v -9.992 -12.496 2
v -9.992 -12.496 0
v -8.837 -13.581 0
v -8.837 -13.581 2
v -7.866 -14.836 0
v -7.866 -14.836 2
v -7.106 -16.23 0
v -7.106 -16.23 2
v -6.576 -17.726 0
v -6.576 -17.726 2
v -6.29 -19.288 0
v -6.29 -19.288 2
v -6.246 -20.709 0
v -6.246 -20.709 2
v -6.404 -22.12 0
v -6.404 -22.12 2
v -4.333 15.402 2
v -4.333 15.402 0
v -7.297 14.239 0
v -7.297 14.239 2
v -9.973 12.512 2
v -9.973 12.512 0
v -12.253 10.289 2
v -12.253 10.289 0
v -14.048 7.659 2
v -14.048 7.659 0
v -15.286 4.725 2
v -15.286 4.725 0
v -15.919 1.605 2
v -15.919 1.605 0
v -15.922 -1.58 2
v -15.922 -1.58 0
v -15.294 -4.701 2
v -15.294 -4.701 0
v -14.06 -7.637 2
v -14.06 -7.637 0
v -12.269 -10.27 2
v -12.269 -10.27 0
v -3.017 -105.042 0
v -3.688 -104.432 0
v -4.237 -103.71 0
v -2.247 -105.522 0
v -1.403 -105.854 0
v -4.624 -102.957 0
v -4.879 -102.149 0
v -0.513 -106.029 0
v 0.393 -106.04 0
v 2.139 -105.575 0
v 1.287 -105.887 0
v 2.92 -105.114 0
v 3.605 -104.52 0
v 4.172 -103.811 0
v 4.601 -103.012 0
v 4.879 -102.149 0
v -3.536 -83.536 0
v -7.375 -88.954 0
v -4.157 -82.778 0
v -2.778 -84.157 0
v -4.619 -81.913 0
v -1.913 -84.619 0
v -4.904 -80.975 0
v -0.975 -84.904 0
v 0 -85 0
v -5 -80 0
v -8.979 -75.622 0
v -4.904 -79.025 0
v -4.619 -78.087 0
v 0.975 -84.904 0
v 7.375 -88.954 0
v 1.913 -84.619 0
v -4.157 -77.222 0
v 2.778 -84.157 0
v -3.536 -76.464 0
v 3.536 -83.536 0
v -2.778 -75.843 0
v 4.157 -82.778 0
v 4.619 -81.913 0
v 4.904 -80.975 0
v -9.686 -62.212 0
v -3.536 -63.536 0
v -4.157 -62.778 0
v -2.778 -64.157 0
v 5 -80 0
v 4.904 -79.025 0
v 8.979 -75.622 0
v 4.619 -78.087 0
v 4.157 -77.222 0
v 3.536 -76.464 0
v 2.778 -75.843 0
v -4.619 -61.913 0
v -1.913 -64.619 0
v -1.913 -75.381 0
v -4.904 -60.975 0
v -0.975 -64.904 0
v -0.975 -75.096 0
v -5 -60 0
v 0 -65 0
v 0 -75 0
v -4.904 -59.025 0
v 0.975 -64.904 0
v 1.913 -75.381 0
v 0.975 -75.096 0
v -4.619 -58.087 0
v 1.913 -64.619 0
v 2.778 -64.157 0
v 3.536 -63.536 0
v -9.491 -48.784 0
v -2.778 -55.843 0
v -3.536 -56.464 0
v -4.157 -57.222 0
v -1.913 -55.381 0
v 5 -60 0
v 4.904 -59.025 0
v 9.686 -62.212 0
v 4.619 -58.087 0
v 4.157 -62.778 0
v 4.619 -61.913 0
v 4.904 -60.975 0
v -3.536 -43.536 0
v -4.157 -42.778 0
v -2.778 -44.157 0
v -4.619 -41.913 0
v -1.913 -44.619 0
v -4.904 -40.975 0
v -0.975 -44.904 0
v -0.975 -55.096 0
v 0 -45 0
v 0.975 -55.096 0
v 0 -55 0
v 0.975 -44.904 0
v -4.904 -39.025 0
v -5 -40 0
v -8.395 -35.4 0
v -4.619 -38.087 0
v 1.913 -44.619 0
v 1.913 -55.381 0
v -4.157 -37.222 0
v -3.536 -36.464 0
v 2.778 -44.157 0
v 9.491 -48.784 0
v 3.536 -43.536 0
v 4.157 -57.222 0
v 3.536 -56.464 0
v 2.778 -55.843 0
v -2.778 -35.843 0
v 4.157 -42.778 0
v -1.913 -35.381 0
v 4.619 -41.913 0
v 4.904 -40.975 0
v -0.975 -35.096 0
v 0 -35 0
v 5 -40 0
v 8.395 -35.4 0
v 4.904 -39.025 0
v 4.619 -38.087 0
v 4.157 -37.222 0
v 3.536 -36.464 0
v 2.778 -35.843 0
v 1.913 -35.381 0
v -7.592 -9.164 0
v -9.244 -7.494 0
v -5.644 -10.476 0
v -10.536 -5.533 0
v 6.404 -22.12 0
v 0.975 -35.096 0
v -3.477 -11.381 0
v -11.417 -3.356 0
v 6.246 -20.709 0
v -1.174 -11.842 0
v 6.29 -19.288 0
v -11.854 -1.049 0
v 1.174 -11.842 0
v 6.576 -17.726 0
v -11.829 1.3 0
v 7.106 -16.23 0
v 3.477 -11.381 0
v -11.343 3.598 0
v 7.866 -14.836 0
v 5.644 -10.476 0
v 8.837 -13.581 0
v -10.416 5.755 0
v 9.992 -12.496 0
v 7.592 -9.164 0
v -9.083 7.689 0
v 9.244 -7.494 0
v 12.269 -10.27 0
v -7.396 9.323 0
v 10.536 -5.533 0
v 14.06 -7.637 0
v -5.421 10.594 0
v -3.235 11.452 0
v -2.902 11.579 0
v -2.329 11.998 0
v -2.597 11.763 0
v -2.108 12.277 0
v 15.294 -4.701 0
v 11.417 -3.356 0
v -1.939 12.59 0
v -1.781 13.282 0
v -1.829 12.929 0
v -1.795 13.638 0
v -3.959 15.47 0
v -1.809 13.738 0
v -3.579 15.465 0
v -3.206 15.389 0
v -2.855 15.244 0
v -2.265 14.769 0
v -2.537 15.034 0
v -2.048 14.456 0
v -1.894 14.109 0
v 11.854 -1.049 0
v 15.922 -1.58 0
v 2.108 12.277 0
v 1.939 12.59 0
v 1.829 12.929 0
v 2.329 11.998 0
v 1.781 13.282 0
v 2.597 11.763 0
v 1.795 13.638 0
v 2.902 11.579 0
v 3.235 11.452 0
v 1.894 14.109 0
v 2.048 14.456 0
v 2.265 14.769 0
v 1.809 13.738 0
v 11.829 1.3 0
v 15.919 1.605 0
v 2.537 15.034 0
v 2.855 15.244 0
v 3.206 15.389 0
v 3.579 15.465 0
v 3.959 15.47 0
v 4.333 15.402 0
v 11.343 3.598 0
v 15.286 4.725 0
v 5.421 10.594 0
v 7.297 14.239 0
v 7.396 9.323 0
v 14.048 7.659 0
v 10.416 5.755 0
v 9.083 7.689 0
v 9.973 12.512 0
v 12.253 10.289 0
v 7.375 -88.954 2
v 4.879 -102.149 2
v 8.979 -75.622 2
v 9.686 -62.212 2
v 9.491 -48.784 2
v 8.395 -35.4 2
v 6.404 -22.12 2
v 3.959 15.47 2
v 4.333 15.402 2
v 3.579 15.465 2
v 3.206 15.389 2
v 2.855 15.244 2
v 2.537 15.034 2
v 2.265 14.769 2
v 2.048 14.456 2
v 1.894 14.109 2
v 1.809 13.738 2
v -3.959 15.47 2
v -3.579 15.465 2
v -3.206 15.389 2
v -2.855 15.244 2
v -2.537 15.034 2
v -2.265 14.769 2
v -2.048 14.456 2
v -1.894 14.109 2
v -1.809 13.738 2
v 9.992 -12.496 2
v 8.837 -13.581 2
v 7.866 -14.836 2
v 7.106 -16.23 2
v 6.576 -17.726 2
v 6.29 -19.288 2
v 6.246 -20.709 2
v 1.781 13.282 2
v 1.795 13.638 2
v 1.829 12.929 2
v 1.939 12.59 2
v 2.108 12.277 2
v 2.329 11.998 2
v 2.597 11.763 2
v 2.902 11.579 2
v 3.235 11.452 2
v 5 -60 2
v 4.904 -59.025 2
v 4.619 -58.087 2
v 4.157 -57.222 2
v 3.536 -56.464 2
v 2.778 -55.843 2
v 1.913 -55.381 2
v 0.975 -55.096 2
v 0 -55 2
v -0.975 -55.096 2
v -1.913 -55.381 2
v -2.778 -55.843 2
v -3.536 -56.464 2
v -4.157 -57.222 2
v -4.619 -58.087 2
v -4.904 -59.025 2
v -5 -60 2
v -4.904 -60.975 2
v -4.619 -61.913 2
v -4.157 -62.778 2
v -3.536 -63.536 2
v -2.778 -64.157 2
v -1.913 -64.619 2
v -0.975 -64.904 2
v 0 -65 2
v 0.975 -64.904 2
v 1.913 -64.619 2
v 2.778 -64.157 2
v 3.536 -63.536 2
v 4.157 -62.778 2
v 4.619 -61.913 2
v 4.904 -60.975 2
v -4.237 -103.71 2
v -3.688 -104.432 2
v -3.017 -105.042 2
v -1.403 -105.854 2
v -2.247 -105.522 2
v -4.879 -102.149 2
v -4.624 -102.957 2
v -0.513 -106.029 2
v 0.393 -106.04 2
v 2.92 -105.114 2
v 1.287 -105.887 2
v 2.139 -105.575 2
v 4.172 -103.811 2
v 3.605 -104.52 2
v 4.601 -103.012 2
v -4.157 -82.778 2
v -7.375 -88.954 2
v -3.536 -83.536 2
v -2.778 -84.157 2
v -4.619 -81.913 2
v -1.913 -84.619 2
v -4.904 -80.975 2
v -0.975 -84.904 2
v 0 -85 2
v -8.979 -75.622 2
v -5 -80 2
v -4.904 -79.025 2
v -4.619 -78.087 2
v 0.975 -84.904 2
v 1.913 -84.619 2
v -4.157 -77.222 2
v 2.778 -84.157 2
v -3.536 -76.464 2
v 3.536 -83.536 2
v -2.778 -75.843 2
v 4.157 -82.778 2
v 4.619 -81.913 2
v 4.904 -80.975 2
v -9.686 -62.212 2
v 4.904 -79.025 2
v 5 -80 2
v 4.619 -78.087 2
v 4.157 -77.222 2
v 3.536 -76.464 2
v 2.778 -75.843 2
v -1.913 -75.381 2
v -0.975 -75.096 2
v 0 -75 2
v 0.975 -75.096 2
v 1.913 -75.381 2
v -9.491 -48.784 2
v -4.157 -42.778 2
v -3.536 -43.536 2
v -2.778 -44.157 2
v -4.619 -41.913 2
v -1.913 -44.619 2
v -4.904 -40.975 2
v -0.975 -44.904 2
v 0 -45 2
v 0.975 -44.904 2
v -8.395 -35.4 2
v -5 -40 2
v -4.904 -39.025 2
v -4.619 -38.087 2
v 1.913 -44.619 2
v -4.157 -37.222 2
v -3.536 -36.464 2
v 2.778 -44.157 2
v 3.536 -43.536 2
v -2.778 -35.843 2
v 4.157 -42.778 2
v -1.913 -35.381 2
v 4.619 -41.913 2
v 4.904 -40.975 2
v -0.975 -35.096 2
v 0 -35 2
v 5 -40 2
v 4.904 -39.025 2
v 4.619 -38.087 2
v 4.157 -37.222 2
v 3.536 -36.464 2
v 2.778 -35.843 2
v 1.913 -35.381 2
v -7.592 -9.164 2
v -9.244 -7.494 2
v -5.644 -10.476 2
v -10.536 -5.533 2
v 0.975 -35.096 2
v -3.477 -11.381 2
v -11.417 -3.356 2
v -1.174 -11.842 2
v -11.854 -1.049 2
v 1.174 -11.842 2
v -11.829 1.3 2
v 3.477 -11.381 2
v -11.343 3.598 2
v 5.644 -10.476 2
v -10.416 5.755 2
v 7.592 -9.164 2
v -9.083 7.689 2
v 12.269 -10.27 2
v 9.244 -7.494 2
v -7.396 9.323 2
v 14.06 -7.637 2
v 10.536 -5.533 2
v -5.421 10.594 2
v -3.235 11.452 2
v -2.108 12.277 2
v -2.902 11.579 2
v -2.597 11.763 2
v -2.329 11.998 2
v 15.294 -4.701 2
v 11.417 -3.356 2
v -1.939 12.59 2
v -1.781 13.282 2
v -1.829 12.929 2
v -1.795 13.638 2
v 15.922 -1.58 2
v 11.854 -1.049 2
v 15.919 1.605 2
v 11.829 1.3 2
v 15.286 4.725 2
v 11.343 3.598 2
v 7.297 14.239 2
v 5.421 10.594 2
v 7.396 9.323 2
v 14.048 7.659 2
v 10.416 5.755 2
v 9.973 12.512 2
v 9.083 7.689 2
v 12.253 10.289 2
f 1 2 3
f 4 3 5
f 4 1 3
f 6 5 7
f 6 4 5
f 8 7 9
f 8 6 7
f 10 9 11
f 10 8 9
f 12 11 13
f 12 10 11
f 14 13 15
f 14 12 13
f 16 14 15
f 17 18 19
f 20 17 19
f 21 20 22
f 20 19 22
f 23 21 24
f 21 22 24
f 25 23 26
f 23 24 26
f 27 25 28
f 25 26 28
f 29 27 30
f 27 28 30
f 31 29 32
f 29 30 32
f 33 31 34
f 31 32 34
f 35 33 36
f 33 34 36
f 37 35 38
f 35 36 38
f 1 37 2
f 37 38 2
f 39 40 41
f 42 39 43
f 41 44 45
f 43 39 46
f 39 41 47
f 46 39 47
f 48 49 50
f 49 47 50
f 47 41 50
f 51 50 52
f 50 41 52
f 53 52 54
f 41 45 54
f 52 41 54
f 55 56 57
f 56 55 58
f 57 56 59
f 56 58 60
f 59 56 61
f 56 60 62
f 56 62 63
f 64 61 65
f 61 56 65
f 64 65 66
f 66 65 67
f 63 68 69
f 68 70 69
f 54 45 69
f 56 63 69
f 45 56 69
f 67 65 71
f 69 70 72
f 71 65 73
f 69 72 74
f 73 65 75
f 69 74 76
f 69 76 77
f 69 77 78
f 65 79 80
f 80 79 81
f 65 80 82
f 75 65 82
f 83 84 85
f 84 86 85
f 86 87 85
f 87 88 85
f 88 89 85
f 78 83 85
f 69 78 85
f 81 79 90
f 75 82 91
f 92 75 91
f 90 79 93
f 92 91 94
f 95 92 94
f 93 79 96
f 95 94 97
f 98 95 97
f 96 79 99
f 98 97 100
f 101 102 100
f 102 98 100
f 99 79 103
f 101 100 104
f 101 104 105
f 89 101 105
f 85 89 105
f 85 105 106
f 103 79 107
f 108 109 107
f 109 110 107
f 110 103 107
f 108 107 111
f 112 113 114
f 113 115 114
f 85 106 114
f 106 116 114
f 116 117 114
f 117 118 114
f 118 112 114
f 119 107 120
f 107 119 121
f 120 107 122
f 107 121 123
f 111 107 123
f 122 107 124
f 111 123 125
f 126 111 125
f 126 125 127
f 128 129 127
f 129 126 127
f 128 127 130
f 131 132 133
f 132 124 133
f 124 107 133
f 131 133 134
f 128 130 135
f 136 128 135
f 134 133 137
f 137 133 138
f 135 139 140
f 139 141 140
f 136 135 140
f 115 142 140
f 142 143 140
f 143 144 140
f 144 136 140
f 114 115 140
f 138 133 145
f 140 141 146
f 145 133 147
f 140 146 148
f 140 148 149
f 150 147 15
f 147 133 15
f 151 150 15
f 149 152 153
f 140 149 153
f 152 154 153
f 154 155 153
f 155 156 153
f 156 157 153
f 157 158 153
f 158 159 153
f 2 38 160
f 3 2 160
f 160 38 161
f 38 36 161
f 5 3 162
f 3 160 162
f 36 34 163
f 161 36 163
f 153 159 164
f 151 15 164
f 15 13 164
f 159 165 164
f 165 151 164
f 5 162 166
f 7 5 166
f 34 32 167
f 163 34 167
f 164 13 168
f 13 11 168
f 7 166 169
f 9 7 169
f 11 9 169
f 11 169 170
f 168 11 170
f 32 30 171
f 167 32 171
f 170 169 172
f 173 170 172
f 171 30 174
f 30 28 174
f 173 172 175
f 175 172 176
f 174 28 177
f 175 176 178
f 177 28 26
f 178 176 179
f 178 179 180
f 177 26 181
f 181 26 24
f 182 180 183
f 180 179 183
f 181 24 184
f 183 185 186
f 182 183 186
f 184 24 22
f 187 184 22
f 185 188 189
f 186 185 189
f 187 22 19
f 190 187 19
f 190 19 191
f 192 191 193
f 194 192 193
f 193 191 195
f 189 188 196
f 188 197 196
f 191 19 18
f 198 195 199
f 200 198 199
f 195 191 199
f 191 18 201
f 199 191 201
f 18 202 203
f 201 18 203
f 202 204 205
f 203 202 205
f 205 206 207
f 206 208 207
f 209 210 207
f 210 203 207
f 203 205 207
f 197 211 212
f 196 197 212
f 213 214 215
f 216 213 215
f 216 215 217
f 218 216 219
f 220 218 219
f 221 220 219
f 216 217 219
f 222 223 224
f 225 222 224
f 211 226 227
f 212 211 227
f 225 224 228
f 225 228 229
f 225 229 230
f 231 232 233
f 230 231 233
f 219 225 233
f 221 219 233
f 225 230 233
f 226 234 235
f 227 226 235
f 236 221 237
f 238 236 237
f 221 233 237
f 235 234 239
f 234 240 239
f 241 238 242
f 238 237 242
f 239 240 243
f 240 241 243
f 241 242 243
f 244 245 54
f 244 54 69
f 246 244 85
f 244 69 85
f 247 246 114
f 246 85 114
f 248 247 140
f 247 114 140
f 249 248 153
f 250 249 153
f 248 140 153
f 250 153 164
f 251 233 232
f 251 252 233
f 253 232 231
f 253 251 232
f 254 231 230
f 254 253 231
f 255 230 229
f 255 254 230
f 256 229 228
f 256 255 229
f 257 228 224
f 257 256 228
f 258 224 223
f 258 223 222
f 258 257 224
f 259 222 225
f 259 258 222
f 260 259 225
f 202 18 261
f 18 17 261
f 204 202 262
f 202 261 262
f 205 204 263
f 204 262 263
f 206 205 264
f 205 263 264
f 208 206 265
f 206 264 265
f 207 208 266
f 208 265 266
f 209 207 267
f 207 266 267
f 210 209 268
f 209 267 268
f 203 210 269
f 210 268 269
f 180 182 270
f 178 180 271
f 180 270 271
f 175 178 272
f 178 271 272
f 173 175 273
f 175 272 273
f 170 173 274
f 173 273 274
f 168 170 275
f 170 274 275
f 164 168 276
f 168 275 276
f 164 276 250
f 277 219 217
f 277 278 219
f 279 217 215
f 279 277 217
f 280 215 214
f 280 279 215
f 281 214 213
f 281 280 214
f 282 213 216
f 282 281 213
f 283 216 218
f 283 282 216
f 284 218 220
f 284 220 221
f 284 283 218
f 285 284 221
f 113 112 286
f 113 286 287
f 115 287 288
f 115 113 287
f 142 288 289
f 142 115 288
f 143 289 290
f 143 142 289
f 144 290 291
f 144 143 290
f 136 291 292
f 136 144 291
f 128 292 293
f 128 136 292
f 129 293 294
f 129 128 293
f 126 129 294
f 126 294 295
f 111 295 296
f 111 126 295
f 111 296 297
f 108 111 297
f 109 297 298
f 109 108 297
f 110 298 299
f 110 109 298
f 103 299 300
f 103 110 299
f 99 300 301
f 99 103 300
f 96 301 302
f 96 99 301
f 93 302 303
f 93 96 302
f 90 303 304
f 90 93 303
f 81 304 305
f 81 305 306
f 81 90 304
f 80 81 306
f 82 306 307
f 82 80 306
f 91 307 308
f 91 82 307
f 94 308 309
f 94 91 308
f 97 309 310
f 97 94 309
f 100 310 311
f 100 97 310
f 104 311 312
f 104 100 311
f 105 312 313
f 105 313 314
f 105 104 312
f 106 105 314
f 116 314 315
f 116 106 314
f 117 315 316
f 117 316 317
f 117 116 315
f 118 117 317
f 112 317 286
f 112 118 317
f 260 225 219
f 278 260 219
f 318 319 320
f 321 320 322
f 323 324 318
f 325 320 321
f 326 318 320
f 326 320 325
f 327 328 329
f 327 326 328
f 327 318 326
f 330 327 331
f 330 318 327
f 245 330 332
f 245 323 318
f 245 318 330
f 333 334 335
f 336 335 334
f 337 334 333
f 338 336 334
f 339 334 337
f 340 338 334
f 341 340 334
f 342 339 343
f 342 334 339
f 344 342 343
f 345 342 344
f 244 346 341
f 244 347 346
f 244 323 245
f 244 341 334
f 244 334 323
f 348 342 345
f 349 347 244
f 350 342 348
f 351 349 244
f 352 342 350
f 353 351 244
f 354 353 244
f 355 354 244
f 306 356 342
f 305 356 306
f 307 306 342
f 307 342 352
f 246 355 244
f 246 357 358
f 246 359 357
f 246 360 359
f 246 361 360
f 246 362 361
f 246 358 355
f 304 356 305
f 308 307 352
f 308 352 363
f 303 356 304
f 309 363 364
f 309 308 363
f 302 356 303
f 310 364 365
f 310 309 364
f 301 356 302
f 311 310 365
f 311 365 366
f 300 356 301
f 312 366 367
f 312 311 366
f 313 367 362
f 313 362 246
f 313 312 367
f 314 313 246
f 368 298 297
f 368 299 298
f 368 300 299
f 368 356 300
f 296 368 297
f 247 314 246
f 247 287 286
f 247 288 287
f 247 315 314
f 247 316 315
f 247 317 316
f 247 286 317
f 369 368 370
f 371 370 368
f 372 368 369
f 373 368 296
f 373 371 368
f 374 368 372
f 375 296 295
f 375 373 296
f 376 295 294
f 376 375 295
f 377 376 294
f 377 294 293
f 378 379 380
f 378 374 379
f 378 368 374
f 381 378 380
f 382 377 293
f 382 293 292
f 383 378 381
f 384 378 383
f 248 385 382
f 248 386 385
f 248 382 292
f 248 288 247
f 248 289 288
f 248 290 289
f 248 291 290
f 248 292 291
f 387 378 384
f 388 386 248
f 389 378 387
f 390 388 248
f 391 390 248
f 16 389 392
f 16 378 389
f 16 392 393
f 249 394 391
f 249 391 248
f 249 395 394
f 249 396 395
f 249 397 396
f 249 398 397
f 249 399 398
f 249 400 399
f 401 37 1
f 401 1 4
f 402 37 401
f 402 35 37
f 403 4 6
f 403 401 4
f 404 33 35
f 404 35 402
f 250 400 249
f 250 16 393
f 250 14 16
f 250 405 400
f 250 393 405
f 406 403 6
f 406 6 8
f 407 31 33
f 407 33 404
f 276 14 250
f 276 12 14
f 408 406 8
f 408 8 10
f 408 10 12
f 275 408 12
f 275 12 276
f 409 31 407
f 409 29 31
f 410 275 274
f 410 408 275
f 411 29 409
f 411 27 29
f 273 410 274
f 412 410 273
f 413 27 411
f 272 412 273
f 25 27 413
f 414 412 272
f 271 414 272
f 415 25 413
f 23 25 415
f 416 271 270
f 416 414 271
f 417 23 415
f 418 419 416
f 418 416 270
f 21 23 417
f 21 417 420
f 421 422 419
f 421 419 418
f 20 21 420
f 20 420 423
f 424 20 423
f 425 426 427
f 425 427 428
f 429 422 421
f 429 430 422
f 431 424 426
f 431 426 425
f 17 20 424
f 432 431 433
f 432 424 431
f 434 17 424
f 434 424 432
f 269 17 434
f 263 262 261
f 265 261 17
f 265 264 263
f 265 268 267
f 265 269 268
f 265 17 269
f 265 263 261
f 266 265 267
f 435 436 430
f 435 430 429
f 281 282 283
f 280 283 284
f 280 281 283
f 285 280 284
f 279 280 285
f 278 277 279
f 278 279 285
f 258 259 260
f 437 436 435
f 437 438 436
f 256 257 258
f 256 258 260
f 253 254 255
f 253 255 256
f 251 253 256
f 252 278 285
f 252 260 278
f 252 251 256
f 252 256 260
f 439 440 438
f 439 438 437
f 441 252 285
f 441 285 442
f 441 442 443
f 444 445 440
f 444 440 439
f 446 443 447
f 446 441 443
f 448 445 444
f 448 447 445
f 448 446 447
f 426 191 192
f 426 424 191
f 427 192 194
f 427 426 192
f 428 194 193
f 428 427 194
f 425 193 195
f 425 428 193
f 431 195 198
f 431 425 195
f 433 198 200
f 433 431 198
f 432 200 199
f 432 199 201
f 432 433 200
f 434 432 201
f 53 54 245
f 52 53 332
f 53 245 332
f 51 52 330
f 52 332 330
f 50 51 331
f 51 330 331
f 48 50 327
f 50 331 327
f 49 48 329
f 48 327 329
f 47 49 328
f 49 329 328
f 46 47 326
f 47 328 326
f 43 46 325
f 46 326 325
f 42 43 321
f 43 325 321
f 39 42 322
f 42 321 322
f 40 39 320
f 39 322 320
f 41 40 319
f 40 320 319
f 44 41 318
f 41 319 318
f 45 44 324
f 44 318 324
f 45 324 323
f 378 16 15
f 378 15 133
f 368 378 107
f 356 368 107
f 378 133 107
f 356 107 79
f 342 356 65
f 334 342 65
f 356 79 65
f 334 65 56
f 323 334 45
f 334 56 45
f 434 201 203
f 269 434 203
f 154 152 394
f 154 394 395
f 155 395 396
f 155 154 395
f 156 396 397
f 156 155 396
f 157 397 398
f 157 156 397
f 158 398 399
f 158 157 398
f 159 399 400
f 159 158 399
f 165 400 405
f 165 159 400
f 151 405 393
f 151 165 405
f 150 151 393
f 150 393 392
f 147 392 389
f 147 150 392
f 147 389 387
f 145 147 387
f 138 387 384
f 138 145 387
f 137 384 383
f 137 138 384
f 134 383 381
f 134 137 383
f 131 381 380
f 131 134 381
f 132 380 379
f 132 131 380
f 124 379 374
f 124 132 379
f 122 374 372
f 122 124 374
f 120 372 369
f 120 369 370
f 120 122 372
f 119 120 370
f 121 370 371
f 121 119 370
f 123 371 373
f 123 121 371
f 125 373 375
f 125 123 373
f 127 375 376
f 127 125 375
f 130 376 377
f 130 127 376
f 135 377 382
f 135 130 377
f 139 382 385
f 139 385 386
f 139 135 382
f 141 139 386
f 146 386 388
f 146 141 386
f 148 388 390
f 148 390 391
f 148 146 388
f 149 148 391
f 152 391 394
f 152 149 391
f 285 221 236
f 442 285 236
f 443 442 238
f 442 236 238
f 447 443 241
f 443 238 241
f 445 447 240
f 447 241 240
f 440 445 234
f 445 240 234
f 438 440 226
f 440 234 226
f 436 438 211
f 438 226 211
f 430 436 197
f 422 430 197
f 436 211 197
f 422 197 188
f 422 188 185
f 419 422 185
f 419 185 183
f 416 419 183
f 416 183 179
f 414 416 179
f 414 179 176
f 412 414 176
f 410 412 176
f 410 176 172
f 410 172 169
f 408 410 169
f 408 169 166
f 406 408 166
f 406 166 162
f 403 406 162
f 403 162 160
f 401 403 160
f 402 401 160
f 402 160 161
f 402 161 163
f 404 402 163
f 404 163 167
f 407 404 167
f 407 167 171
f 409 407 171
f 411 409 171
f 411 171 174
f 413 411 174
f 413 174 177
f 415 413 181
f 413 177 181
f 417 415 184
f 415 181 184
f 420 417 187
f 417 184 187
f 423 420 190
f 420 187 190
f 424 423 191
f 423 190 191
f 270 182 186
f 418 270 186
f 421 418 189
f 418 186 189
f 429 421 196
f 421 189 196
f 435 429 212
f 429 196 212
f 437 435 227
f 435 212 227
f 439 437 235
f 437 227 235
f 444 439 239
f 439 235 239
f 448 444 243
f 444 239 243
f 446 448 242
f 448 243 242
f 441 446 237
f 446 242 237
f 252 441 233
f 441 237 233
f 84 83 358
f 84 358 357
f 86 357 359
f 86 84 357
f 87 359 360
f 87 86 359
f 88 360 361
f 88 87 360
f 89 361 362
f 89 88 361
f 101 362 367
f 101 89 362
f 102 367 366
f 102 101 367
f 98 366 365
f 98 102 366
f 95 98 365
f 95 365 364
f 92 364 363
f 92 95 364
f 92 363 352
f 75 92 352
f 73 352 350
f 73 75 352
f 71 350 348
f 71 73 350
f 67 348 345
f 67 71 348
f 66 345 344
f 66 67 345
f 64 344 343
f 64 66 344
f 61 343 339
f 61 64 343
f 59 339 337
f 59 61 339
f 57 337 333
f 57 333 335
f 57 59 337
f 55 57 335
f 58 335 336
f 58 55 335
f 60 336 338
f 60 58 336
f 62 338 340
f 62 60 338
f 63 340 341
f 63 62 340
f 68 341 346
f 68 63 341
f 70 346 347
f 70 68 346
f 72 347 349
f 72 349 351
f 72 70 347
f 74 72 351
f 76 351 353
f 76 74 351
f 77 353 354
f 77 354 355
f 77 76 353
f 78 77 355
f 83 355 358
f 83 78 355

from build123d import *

# Parameters (mm, degrees)
F0_R     = 5
F1_DEPTH = 2
F2_R     = 10
F3_R     = 5
F4_R     = 2


with BuildPart() as f1:
    # F0 (on Top) → F1 (new body)
    with BuildSketch(Plane.XY):
        with BuildLine():
            ThreePointArc((1.553262, 11.798194), (0, -11.9), (-1.553262, 11.798194))
            Line((-1.553262, 11.798194), (-2.088419, 15.863118))
            ThreePointArc((-2.088419, 15.863118), (-15.93017, 1.493216), (-5, -15.198684))
            ThreePointArc((-5, -15.198684), (-9.494839, -67.933061), (0, -120))
            ThreePointArc((0, -120), (9.494839, -67.933061), (5, -15.198684))
            ThreePointArc((5, -15.198684), (15.93017, 1.493216), (2.088419, 15.863118))
            Line((2.088419, 15.863118), (1.553262, 11.798194))
        make_face()
        with Locations((0, -80)):
            Circle(F0_R, mode=Mode.SUBTRACT)
        with Locations((0, -60)):
            Circle(F0_R, mode=Mode.SUBTRACT)
        with Locations((0, -40)):
            Circle(F0_R, mode=Mode.SUBTRACT)
    extrude(amount=F1_DEPTH)

    # F2
    f2_edges = [f1.edges().sort_by_distance(p)[0] for p in [
        (5, -15.198684, 1),
        (-5, -15.198684, 1),
    ]]
    fillet(f2_edges, radius=F2_R)

    # F3
    f3_edges = [f1.edges().sort_by_distance(p)[0] for p in [
        (0, -120, 1),
    ]]
    fillet(f3_edges, radius=F3_R)

    # F4
    f4_edges = [f1.edges().sort_by_distance(p)[0] for p in [
        (-1.553262, 11.798194, 1),
        (1.553262, 11.798194, 1),
        (-2.088419, 15.863118, 1),
        (2.088419, 15.863118, 1),
    ]]
    fillet(f4_edges, radius=F4_R)


solid = f1.part
